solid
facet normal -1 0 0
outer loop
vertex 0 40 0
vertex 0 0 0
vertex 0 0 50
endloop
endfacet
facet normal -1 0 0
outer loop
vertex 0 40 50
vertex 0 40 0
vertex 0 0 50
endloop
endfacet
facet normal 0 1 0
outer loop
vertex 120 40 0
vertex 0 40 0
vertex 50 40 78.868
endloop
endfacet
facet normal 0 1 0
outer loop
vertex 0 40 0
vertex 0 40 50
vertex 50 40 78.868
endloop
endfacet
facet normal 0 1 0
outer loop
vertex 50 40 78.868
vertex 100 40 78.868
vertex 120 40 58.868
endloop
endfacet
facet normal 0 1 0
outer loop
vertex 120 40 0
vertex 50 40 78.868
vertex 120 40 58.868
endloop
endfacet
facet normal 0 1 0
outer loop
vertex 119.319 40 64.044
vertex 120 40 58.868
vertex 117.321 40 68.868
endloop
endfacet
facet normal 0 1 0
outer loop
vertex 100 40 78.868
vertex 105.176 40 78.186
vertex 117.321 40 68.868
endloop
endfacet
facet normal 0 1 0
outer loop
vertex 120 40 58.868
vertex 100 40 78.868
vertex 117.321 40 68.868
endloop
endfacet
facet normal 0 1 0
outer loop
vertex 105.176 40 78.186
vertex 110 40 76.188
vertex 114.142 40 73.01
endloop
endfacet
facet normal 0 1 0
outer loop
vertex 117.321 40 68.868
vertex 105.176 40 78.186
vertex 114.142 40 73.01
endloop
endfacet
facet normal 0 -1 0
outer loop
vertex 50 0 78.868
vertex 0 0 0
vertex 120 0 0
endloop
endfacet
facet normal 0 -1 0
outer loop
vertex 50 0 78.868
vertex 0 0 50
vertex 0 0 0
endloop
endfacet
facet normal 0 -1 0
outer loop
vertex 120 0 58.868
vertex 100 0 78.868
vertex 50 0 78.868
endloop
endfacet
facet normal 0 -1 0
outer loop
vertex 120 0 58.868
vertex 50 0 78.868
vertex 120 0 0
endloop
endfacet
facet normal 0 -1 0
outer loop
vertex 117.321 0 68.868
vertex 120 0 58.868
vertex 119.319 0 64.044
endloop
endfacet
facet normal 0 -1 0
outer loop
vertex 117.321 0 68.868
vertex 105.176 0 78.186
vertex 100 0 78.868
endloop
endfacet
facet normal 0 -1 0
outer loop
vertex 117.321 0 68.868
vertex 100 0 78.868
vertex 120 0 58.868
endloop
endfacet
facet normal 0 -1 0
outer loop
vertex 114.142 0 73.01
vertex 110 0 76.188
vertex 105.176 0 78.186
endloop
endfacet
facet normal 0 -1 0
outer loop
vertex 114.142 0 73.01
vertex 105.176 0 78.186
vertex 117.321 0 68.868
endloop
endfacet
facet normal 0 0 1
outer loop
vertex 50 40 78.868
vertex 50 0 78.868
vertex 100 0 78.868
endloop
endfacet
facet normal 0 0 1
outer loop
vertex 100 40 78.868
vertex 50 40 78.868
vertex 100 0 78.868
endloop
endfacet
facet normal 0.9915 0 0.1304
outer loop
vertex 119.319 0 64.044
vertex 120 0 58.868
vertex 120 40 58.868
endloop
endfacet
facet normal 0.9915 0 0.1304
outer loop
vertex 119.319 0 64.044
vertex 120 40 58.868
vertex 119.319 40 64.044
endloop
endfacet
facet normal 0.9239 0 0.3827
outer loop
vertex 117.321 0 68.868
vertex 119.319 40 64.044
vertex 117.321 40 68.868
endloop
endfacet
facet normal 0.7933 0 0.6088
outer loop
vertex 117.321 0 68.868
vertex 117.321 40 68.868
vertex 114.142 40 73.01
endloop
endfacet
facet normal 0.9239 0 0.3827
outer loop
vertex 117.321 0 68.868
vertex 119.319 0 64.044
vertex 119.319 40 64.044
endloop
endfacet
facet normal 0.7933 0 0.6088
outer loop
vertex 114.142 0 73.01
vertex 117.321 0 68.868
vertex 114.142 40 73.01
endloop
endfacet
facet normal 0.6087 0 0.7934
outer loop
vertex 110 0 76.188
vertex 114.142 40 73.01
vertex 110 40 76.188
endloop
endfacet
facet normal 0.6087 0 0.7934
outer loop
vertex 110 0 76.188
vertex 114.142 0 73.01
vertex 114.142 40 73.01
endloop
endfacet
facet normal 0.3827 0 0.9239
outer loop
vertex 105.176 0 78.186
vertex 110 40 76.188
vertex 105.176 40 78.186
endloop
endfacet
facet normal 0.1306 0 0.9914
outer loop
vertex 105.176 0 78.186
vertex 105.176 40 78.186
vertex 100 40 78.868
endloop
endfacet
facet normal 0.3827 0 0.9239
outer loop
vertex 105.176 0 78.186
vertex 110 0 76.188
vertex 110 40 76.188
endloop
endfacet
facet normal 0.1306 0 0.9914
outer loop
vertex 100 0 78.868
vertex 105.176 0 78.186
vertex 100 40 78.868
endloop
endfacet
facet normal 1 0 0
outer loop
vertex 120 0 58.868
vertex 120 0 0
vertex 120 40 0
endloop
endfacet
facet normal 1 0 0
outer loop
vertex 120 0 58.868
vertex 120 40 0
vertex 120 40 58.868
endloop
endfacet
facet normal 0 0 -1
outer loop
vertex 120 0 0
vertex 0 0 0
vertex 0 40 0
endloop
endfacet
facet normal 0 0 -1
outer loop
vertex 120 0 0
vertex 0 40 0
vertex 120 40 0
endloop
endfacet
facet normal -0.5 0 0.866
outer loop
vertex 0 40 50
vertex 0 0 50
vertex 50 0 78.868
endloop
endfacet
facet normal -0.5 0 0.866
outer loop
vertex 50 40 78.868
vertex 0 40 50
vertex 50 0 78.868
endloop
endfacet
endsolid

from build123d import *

# Parameters (mm, degrees)
PAD_DEPTH = 40


with BuildPart() as part:
    # Sketch → Pad (new body)
    with BuildSketch(Plane.XZ):
        with BuildLine():
            Line((0, 0), (120, 0))
            Line((120, 0), (120, 58.867513))
            ThreePointArc((120, 58.867513), (114.142136, 73.009649), (100, 78.867513))
            Line((50, 78.867513), (100, 78.867513))
            Line((0, 50), (50, 78.867513))
            Line((0, 0), (0, 50))
        make_face()
    extrude(amount=-PAD_DEPTH)


solid = part.part
